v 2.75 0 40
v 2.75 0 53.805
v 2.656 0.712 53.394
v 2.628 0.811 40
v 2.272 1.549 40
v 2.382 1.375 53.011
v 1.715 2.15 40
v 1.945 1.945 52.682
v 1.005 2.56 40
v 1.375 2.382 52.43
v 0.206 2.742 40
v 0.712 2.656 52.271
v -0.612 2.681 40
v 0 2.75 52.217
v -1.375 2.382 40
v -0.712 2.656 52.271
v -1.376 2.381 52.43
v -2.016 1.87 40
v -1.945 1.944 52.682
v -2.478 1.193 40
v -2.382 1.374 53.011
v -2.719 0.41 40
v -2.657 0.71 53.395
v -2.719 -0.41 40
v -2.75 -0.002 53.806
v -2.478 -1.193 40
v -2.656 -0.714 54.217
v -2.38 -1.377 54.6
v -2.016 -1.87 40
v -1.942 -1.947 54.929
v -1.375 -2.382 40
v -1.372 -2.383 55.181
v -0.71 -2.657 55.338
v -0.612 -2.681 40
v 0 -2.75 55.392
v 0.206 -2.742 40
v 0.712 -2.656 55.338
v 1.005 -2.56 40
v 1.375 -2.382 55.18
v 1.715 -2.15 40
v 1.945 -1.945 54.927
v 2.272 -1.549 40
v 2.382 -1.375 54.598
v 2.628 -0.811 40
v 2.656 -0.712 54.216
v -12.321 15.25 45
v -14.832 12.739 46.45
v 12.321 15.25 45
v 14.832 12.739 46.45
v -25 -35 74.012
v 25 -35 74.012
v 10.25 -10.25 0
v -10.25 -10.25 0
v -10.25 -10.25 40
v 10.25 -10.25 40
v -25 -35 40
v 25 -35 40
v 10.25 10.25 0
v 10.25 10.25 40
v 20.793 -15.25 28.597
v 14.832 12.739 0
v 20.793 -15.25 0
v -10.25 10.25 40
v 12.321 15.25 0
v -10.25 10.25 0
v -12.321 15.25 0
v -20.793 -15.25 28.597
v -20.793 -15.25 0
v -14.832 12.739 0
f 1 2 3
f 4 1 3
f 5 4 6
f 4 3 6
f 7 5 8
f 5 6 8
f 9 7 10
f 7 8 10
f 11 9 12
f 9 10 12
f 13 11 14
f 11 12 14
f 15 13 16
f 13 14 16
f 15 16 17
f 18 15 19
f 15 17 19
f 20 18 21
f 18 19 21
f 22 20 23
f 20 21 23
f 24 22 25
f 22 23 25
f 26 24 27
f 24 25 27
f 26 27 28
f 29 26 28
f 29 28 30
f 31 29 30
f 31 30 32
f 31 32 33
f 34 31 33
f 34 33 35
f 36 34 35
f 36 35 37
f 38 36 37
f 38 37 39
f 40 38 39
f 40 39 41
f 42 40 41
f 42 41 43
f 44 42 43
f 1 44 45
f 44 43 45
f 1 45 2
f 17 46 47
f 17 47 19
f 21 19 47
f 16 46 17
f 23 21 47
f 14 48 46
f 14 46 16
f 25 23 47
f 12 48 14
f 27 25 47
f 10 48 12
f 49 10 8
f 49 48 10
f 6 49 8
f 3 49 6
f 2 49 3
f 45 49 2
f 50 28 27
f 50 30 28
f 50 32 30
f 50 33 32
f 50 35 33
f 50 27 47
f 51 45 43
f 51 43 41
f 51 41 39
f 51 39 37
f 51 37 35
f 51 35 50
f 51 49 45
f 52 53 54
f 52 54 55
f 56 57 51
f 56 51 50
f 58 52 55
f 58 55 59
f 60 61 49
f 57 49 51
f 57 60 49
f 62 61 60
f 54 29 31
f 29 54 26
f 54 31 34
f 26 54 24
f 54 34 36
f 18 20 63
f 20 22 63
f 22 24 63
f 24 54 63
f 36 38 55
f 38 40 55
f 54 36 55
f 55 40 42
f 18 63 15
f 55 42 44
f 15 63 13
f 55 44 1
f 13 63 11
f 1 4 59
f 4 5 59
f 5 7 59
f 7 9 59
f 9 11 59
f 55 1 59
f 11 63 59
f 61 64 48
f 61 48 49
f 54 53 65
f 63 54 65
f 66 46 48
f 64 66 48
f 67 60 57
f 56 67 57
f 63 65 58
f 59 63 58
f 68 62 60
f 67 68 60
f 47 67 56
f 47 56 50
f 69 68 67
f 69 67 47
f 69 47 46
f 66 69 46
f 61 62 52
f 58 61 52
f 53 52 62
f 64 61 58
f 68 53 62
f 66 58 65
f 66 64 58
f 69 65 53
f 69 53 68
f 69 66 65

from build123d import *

# Parameters (mm, degrees)
SKETCH1_W               = 20.5
SKETCH1_H               = 20.5
BOSS_EXTRUDE1_DEPTH     = 75
SKETCH2_W               = 20.5
SKETCH2_H               = 20.5
SKETCH2_R               = 2.75
BOSS_EXTRUDE2_DEPTH     = 35
CUT_EXTRUDE1_DEPTH      = 26
CUT_EXTRUDE1_DEPTH_BACK = 26


with BuildPart() as part:
    # Sketch1 → Boss-Extrude1 (new body)
    with BuildSketch(Plane.XY):
        Polygon((-25, -35), (-14.832007533, 12.739060279), (-12.321067812, 15.25), (12.321067812, 15.25), (14.832007533, 12.739060279), (25, -35), align=None)
        Rectangle(SKETCH1_W, SKETCH1_H, mode=Mode.SUBTRACT)
    extrude(amount=BOSS_EXTRUDE1_DEPTH)

    # Sketch2 → Boss-Extrude2 (add)
    with BuildSketch(Plane.XY.offset(75)):
        Rectangle(SKETCH2_W, SKETCH2_H)
        Circle(SKETCH2_R, mode=Mode.SUBTRACT)
    extrude(amount=-BOSS_EXTRUDE2_DEPTH)

    # Sketch3 → Cut-Extrude1 (cut, two sides)
    with BuildSketch(Plane(origin=(0, 0, 0), x_dir=(0, 0, -1), z_dir=(1, 0, 0))) as cut_extrude1_sk:
        Polygon((0, -15.25), (-28.597332184, -15.25), (-40, -35), (0, -35), align=None)
        Polygon((-45, 15.25), (-75, -36.711524227), (-75, 15.25), align=None)
    extrude(amount=CUT_EXTRUDE1_DEPTH, mode=Mode.SUBTRACT)
    extrude(cut_extrude1_sk.sketch, amount=-CUT_EXTRUDE1_DEPTH_BACK, mode=Mode.SUBTRACT)


solid = part.part
